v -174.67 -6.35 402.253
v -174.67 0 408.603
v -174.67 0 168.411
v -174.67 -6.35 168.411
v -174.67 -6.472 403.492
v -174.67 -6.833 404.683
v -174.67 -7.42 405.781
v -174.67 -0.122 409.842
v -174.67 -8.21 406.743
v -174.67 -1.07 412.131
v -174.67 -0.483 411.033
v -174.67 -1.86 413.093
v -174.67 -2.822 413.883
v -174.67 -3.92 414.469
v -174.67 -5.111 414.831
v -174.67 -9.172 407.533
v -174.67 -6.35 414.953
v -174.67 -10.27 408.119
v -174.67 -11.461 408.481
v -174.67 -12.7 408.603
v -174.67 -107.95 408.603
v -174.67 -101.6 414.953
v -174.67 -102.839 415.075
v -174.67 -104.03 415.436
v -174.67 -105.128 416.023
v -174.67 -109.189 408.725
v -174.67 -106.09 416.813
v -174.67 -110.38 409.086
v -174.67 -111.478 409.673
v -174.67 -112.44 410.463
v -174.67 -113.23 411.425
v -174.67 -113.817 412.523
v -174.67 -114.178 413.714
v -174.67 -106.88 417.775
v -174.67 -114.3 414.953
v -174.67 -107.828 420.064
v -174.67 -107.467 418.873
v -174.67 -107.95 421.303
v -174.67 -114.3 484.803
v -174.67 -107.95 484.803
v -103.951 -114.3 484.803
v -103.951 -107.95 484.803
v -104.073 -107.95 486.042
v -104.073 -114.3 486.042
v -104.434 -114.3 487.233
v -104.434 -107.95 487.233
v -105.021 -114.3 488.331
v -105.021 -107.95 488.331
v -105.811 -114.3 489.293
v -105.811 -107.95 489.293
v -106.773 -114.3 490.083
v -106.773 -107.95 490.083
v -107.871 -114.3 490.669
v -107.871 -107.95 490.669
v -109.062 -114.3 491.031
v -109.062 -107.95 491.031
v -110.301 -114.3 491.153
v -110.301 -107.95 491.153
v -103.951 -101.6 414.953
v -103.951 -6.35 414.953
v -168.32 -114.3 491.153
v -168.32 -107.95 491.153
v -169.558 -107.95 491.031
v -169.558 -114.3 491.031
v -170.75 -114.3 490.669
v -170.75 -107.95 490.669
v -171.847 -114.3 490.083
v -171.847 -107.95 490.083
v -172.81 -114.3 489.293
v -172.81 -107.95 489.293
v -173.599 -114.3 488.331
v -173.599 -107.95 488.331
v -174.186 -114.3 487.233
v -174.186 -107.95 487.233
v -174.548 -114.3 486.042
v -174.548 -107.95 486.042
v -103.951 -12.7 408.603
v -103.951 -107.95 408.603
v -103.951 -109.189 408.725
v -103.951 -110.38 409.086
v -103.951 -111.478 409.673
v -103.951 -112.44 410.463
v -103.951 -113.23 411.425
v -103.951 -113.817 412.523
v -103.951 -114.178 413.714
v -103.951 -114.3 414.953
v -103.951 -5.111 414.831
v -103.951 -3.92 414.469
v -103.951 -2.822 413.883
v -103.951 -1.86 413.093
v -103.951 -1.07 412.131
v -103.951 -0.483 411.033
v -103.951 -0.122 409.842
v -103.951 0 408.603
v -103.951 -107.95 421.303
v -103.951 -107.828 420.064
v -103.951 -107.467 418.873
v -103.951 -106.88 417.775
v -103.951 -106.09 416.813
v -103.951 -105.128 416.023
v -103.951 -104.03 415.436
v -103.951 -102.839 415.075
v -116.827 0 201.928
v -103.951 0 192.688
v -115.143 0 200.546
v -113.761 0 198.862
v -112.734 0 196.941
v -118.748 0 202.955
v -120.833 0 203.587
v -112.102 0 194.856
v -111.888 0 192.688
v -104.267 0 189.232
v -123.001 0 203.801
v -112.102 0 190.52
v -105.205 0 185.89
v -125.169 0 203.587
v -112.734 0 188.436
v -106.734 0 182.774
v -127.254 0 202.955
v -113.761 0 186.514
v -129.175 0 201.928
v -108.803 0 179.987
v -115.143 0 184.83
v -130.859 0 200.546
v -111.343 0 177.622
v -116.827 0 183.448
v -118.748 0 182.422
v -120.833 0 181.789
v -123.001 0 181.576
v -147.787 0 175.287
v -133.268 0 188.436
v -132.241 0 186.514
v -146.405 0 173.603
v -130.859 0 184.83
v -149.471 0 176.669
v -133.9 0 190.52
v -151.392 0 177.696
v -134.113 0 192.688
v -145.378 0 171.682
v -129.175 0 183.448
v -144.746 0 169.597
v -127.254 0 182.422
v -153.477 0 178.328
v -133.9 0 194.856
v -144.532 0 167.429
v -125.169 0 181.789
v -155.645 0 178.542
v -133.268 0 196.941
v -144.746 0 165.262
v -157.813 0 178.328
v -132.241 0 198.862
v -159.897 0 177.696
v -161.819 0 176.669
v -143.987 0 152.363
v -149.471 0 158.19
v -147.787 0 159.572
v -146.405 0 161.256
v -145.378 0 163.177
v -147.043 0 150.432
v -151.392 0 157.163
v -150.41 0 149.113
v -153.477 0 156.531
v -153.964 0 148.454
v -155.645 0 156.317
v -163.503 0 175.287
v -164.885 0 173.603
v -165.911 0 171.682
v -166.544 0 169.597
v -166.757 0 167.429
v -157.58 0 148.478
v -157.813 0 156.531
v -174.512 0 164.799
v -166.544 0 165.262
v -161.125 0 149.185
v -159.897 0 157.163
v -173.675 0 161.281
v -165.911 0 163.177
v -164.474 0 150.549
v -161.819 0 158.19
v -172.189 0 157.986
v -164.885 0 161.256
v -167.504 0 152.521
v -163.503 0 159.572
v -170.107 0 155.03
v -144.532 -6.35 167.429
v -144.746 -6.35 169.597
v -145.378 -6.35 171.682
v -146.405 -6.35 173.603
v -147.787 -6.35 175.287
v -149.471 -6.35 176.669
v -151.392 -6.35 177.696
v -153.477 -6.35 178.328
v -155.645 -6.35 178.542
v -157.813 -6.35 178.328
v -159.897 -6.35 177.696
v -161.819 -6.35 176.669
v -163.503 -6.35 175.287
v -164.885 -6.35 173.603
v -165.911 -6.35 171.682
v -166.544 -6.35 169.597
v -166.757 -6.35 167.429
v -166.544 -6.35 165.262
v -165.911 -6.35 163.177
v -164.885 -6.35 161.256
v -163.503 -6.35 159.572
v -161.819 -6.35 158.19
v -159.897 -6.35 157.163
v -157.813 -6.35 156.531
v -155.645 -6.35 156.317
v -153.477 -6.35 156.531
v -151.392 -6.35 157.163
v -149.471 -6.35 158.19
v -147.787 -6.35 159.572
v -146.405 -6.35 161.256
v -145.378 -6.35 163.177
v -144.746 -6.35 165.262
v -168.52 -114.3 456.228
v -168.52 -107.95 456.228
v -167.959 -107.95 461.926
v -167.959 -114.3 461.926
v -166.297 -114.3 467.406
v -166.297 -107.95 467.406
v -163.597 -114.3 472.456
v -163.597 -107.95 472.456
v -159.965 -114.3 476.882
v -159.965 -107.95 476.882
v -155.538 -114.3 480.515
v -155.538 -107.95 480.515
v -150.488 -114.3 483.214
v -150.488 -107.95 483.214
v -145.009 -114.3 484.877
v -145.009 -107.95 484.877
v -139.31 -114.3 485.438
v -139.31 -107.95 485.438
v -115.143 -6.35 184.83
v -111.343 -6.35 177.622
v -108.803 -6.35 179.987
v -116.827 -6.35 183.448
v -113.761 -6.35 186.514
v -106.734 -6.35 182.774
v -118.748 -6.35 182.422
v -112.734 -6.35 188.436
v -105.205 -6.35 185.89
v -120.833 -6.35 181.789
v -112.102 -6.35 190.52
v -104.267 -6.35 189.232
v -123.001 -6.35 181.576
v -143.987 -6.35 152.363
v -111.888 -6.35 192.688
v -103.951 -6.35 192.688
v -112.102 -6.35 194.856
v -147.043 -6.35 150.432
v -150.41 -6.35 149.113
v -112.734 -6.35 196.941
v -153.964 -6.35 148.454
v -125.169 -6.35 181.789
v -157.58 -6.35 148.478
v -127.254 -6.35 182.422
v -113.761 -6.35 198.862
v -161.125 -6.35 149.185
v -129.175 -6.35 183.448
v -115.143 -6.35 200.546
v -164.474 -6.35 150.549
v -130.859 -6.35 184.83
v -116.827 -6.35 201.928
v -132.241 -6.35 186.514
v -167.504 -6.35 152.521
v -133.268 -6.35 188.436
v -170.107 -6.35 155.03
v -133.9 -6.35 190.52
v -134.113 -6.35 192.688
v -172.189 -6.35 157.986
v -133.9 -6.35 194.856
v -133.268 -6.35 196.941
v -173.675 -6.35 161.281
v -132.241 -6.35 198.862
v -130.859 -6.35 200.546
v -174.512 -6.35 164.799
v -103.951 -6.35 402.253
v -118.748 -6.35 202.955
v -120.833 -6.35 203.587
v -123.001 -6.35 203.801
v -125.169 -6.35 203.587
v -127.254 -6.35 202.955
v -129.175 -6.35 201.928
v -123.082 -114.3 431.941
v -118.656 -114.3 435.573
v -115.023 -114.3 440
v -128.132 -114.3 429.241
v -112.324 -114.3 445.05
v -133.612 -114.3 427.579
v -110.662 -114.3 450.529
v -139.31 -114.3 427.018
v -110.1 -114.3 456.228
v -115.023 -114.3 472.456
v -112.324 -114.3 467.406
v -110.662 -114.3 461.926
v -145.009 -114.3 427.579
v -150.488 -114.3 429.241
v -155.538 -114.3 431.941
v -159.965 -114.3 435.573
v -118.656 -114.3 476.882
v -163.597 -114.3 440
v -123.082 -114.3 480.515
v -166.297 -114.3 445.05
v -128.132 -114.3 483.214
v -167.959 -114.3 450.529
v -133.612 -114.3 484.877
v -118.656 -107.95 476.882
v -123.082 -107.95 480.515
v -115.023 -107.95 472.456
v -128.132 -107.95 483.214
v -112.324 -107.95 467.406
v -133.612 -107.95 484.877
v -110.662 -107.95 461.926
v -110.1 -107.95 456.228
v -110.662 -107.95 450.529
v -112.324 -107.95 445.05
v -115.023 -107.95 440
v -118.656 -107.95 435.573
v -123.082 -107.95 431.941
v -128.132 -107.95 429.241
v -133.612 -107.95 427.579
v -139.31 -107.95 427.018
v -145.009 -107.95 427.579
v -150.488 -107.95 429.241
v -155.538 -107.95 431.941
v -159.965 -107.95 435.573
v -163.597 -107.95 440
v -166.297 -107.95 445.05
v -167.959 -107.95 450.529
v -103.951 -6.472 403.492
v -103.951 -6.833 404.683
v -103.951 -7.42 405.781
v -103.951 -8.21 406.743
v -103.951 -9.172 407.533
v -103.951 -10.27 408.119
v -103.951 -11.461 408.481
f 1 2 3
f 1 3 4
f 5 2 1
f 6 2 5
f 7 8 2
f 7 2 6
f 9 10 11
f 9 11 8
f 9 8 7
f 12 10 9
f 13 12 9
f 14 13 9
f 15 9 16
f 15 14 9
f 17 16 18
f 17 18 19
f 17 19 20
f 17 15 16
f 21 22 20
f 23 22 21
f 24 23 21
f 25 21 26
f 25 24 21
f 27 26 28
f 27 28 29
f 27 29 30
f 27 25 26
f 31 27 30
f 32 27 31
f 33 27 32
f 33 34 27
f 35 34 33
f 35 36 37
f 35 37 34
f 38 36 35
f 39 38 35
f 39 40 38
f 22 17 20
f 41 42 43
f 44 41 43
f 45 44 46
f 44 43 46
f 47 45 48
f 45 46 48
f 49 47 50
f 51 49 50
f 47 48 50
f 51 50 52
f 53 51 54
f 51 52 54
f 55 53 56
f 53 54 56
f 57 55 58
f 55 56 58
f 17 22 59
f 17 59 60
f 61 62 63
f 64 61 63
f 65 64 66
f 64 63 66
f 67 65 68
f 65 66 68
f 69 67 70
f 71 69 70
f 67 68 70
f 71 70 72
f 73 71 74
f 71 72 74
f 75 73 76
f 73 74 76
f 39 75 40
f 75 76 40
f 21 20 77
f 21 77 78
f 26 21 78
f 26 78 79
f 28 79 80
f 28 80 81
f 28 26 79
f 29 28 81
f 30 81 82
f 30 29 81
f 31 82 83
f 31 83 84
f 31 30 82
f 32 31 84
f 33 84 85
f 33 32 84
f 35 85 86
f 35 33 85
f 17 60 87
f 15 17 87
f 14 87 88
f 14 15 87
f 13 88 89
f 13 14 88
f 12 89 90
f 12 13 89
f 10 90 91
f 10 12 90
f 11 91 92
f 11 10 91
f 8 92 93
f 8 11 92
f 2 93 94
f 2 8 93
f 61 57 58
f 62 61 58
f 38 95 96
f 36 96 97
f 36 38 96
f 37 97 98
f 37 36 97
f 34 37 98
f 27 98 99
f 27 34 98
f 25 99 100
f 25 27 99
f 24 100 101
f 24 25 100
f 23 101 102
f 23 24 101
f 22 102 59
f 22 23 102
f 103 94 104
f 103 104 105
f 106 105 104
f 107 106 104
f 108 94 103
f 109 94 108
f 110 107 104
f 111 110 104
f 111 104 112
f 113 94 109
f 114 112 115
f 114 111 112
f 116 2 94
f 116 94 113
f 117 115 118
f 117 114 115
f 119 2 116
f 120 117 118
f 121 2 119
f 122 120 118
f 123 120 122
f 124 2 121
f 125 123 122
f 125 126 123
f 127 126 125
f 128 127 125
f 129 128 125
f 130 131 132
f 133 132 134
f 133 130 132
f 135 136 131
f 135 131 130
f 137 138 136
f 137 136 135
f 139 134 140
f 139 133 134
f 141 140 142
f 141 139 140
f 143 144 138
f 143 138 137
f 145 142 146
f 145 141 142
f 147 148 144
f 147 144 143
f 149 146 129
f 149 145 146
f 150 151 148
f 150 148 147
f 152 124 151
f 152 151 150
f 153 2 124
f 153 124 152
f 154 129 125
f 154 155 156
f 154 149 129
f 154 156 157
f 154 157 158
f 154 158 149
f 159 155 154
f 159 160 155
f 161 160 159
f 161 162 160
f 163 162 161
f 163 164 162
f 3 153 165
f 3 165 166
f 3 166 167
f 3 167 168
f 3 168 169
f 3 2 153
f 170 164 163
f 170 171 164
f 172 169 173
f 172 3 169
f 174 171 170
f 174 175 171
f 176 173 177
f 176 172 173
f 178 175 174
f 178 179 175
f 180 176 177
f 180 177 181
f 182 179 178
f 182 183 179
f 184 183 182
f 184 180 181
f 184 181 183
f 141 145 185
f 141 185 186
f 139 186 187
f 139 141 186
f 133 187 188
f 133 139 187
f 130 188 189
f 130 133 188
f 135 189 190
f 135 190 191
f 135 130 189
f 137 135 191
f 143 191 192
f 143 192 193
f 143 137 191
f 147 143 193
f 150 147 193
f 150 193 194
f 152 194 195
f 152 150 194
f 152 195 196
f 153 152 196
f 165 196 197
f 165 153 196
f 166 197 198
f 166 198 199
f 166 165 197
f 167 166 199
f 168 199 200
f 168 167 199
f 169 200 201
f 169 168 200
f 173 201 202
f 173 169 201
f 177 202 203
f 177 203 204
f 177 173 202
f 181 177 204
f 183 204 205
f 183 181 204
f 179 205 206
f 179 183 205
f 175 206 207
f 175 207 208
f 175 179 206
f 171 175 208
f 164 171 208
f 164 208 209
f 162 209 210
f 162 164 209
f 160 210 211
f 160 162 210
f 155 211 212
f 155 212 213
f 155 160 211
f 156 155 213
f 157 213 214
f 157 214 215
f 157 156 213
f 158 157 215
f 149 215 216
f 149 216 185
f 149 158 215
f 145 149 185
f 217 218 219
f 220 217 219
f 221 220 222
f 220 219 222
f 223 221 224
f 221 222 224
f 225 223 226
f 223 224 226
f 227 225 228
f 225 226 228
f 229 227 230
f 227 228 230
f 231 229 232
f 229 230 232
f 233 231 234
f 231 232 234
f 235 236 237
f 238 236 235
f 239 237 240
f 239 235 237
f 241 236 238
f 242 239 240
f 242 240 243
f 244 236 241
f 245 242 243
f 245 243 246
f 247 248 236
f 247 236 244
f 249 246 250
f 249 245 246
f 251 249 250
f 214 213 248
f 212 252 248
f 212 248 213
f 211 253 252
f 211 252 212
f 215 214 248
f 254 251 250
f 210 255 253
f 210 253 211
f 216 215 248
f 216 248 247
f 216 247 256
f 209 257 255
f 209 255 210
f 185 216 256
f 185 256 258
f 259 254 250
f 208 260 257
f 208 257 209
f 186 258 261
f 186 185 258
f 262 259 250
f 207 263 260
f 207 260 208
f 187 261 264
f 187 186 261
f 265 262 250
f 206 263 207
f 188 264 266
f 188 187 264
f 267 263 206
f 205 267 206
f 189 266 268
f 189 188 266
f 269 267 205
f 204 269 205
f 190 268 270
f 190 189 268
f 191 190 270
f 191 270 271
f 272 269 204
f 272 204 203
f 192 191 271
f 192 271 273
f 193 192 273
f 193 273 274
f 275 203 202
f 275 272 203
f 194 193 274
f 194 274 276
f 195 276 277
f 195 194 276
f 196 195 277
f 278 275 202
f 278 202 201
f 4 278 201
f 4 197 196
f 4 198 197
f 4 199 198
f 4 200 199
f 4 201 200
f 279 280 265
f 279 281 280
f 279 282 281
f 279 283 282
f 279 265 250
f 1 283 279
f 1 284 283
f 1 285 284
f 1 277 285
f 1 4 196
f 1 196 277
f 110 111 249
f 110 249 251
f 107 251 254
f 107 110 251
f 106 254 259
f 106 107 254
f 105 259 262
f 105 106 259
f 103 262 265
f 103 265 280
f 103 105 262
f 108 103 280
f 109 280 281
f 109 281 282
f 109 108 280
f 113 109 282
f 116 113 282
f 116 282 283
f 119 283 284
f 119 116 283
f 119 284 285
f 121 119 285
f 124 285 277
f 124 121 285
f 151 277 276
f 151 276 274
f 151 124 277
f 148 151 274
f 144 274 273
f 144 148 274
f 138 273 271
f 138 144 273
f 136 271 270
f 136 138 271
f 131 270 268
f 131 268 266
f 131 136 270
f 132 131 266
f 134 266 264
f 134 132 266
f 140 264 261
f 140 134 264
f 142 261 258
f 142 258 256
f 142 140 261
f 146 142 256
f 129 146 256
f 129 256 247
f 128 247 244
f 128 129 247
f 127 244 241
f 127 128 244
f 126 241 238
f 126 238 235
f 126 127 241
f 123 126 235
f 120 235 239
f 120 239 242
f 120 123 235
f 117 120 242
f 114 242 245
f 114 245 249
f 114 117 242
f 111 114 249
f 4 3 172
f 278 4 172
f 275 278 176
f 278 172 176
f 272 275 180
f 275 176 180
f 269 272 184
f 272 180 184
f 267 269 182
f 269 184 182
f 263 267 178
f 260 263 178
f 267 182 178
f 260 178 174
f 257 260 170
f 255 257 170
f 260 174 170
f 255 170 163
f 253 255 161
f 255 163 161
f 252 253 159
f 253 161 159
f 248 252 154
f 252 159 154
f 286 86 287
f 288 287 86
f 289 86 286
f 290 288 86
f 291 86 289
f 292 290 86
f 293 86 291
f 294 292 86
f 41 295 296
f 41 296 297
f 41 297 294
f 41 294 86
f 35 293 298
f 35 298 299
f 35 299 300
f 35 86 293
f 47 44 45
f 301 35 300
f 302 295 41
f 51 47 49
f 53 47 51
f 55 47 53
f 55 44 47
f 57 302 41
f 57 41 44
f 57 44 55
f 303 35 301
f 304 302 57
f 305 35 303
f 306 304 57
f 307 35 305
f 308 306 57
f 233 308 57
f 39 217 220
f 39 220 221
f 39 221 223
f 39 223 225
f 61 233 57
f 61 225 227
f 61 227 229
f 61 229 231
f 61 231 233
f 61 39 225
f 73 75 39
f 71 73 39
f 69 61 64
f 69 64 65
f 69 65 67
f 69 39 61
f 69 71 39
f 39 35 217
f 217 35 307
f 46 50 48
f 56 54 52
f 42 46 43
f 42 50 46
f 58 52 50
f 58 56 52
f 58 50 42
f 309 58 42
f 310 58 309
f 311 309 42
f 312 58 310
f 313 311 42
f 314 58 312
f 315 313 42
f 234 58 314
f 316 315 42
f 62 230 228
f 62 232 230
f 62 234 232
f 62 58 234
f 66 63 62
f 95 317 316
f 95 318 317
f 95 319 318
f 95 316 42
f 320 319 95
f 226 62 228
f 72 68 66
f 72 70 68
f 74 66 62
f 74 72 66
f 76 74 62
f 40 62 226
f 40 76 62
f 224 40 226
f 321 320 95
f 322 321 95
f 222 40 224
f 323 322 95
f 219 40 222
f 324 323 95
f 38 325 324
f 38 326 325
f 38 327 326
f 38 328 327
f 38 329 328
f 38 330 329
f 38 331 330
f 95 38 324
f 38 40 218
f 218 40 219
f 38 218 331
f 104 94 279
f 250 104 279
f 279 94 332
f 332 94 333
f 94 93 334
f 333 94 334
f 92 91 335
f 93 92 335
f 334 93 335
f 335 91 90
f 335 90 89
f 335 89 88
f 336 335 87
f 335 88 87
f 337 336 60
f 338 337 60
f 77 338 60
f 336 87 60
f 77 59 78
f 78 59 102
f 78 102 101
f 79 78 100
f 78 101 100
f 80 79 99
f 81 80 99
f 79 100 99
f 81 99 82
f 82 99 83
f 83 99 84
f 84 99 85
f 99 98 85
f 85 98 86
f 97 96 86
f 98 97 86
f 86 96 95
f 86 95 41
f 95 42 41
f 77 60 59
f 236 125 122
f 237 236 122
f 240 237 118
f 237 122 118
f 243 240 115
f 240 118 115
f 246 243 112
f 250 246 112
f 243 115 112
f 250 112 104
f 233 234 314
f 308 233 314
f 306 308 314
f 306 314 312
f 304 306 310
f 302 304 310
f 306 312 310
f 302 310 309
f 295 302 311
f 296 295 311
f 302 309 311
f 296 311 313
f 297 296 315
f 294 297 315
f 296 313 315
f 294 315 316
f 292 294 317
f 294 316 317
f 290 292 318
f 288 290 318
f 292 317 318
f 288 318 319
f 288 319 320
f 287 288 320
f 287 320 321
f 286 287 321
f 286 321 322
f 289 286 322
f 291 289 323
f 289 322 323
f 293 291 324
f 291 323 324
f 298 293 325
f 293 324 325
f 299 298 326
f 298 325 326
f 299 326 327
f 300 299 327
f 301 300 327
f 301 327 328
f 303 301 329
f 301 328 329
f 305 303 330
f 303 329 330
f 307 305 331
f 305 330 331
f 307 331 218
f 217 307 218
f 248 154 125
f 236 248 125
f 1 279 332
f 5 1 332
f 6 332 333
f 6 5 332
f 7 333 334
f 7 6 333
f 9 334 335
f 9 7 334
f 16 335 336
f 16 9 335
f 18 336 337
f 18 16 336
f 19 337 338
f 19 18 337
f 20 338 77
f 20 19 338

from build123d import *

# Parameters (mm, degrees)
F0_R     = 11.1125
F1_DEPTH = 6.35
F3_DEPTH = 70.7186416791
F5_DEPTH = 6.35
F7_DEPTH = 6.35


with BuildPart() as f1:
    # F0 (on Front) → F1 (new body)
    with BuildSketch(Plane.XZ):
        with BuildLine():
            Line((-174.6695893067, 281.6027870952), (-174.6695893067, 168.4105260595))
            ThreePointArc((-174.6695893067, 168.4105260595), (-164.4736790686, 150.5488967565), (-143.9870209187, 152.3630700653))
            Line((-143.9870209187, 152.3630700653), (-111.3431020089, 177.6217355725))
            ThreePointArc((-111.3431020089, 177.6217355725), (-105.8985434247, 184.2970768892), (-103.9509476276, 192.6881596848))
            Line((-103.9509476276, 192.6881596848), (-103.9509476276, 281.6027870952))
            Line((-103.9509476276, 281.6027870952), (-174.6695893067, 281.6027870952))
        make_face()
        with Locations((-155.6448665375, 167.4294941775)):
            Circle(F0_R, mode=Mode.SUBTRACT)
        with Locations((-123.0009476276, 192.6881596848)):
            Circle(F0_R, mode=Mode.SUBTRACT)
    extrude(amount=F1_DEPTH)

    # F2 (on face) → F3 (join, through all)
    with BuildSketch(Plane(origin=(-174.6695893067, 0, 0), x_dir=(0, -1, 0), z_dir=(-1, 0, 0))):
        with BuildLine():
            Line((0, 408.6027870952), (0, 281.6027870952))
            Line((0, 281.6027870952), (6.35, 281.6027870952))
            Line((6.35, 281.6027870952), (6.35, 402.2527870952))
            ThreePointArc((6.35, 402.2527870952), (8.2098719395, 406.7429151557), (12.7, 408.6027870952))
            Line((12.7, 408.6027870952), (107.95, 408.6027870952))
            ThreePointArc((107.95, 408.6027870952), (112.4401280605, 410.4626590346), (114.3, 414.9527870952))
            Line((114.3, 414.9527870952), (114.3, 491.1527870952))
            Line((114.3, 491.1527870952), (107.95, 491.1527870952))
            Line((107.95, 491.1527870952), (107.95, 421.3027870952))
            ThreePointArc((107.95, 421.3027870952), (106.0901280605, 416.8126590346), (101.6, 414.9527870952))
            Line((101.6, 414.9527870952), (6.35, 414.9527870952))
            ThreePointArc((6.35, 414.9527870952), (1.8598719395, 413.0929151557), (0, 408.6027870952))
        make_face()
    extrude(amount=-F3_DEPTH)

    # F4 (on face) → F5 (cut, through all)
    with BuildSketch(Plane(origin=(0, -107.95, 0), x_dir=(-1, 0, 0), z_dir=(0, 1, 0))):
        with BuildLine():
            ThreePointArc((139.3102684671, 485.4377870952), (118.6556793887, 435.5731980167), (168.5202684671, 456.2277870952))
            ThreePointArc((168.5202684671, 456.2277870952), (159.9648575456, 476.8823761736), (139.3102684671, 485.4377870952))
        make_face()
    extrude(amount=-F5_DEPTH, mode=Mode.SUBTRACT)

    # F6 (on face) → F7 (cut, through all)
    with BuildSketch(Plane(origin=(0, -107.95, 0), x_dir=(-1, 0, 0), z_dir=(0, 1, 0))):
        with BuildLine():
            ThreePointArc((103.9509476276, 484.8027870952), (105.8108195671, 489.2929151557), (110.3009476276, 491.1527870952))
            Line((110.3009476276, 491.1527870952), (103.9509476276, 491.1527870952))
            Line((103.9509476276, 491.1527870952), (103.9509476276, 484.8027870952))
        make_face()
        with BuildLine():
            Line((174.6695893067, 491.1527870952), (168.3195893067, 491.1527870952))
            ThreePointArc((168.3195893067, 491.1527870952), (172.8097173672, 489.2929151557), (174.6695893067, 484.8027870952))
            Line((174.6695893067, 484.8027870952), (174.6695893067, 491.1527870952))
        make_face()
    extrude(amount=-F7_DEPTH, mode=Mode.SUBTRACT)


solid = f1.part
